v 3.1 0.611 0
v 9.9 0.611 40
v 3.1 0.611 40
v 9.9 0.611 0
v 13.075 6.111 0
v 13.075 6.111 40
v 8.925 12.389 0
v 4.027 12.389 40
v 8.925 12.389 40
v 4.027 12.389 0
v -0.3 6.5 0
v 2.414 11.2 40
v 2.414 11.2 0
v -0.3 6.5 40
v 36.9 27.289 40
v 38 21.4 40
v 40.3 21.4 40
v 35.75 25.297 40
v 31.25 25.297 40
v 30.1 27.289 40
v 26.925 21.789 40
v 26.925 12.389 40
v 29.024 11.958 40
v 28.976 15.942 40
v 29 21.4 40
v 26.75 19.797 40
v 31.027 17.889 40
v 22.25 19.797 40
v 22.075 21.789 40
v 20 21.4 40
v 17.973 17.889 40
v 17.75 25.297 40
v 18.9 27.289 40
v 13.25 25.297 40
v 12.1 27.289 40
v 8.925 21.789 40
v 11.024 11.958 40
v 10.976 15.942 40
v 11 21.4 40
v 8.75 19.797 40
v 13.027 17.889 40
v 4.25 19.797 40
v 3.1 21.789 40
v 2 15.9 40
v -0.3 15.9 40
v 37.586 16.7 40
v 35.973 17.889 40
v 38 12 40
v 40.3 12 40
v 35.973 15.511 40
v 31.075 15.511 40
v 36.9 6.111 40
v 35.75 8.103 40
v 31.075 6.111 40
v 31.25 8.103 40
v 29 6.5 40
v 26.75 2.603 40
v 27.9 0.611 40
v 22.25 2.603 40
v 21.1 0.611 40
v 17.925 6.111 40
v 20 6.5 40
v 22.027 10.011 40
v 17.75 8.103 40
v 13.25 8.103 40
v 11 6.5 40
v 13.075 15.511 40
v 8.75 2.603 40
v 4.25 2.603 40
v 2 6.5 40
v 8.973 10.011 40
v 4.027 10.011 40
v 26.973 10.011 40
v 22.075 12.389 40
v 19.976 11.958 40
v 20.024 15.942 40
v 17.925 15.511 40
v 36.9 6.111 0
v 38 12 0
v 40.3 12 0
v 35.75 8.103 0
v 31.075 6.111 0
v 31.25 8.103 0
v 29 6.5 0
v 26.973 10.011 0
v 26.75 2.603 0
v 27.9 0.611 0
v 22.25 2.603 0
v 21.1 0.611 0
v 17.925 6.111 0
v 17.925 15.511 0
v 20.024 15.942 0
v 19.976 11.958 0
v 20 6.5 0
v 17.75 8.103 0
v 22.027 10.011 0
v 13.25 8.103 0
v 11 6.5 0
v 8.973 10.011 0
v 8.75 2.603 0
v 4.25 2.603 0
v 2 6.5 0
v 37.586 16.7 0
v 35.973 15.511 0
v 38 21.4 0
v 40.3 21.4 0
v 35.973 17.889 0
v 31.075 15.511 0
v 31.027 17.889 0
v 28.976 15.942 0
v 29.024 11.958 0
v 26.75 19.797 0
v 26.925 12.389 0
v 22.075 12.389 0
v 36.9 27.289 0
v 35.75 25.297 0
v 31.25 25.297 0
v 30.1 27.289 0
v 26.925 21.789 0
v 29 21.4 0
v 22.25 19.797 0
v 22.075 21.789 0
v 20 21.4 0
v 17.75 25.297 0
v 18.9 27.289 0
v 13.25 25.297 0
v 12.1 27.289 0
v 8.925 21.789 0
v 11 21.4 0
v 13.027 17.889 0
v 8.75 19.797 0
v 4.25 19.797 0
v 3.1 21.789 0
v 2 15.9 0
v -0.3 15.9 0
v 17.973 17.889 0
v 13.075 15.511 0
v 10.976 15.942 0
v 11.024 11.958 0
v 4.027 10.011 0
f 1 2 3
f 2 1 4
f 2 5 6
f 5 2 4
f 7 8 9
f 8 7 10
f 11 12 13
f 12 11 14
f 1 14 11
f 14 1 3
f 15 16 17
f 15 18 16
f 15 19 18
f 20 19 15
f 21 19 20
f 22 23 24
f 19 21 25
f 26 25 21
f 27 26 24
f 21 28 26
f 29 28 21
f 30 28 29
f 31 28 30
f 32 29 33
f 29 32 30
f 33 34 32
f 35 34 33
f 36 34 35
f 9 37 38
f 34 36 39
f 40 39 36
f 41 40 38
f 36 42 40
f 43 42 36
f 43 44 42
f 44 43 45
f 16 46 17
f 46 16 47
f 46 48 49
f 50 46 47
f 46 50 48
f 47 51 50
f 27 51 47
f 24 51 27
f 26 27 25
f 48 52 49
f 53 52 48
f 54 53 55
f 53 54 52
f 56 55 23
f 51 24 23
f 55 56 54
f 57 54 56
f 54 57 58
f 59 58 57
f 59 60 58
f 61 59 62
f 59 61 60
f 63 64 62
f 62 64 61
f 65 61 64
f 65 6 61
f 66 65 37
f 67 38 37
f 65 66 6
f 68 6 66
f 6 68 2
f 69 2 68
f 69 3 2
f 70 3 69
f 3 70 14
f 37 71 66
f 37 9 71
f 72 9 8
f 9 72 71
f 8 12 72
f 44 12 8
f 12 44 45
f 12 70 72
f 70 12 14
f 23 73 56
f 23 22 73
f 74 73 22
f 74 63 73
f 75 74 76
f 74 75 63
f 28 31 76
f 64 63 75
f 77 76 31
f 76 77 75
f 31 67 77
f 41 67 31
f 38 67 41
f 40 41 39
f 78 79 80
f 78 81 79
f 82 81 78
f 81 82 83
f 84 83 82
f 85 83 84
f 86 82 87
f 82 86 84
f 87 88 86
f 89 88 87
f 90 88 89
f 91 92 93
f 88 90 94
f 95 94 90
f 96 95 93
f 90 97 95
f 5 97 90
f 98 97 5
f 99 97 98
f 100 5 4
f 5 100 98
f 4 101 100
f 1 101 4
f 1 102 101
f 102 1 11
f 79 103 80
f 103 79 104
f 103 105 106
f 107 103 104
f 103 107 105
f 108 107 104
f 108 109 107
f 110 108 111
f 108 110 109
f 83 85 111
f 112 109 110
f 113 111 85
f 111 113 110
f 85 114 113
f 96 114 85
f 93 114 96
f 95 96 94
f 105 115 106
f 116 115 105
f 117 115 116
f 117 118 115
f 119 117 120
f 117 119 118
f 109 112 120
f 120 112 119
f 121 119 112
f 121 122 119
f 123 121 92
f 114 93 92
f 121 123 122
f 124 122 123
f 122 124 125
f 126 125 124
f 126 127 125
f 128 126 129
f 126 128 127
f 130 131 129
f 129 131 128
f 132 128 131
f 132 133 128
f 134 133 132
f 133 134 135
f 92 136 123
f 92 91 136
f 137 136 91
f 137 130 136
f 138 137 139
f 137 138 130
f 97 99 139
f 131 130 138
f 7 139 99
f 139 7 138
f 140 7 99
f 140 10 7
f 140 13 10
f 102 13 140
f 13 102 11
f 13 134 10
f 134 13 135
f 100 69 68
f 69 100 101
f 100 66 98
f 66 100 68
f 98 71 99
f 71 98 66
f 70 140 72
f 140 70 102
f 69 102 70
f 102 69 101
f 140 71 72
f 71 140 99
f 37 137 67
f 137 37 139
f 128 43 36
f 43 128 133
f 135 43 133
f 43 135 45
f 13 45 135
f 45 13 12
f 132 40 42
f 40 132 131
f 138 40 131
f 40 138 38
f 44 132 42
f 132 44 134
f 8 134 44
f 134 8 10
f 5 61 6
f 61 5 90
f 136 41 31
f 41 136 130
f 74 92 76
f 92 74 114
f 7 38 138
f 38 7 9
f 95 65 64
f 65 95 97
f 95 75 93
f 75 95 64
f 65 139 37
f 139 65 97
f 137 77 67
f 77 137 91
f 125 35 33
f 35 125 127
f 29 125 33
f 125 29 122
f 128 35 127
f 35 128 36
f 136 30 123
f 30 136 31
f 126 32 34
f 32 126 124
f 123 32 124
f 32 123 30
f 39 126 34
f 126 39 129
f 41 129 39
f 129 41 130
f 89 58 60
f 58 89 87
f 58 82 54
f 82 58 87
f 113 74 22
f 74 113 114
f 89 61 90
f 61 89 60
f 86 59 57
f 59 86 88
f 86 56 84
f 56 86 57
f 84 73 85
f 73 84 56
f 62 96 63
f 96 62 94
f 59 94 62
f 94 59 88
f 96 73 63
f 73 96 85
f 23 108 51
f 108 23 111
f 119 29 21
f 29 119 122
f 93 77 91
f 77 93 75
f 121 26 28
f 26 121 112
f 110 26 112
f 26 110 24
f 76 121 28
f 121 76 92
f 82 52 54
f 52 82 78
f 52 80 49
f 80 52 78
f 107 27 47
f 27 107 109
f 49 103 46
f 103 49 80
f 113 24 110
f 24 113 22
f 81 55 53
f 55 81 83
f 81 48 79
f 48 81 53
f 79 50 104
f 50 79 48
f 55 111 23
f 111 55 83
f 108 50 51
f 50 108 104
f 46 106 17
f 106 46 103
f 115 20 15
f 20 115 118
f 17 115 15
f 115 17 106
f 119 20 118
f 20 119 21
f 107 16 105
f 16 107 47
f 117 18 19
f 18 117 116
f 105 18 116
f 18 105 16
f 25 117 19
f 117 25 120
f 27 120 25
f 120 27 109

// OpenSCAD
// [FL_INDEX: keywords="openscad, 3d_parametric, A_Nest_for_Bees_-_Now_with_Customizer_Support, csg_solid" | COT="Parametric OpenSCAD design from 3DCodeverse"]
// Title: A Nest for Bees - Now with Customizer Support!

 /*!
@brief A Nest for Bees
@details This OpenSCAD script will generate a simple multi unit Bpartment to hold your Bees

@author Mark Gaffney
@version 0.4
@date 2013-03-19

@todo
Fill with Bees!

@warning
Bees should not be disturbed willy nilly!

@note
Changes from previous versions:
0.4
 - renamed some varaibles to make more easy to use with "MakerBot's Thingiverse Customizer"
 - fixed some alignment issues with hexagons
 - fixed off by 1 error for rows and columns
 - fixed some manifoldness issues with cutouts
0.3
 - fixed up some translates to properly account for the chosen wall thickness
 - added option to make hexagons...but it's not very pretty
0.2
 - added union command so all the cells are joined as one solid piece
0.1
 - First implementation

@attention
Copyright (c) 2013 Tyndall National Institute.
All rights reserved.
Permission to use, copy, modify, and distribute this software and its documentation for any purpose, without fee, and without written agreement is hereby granted, provided that the above copyright notice and the following two paragraphs appear in all copies of this software. 

IN NO EVENT SHALL TYNDALL NATIONAL INSTITUTE BE LIABLE TO ANY PARTY FOR DIRECT, INDIRECT, SPECIAL, INCIDENTAL, OR CONSEQUENTIAL DAMAGES ARISING OUT OF THE USE OF THIS SOFTWARE AND ITS DOCUMENTATION, EVEN IF TYNDALL NATIONAL INSTITUTE HAS BEEN ADVISED OF THE POSSIBILITY OF SUCH DAMAGE.

TYNDALL NATIONAL INSTITUTE SPECIFICALLY DISCLAIMS ANY WARRANTIES, INCLUDING, BUT NOT LIMITED TO, THE IMPLIED WARRANTIES OF MERCHANTABILITY AND FITNESS FOR A PARTICULAR PURPOSE.  THE SOFTWARE PROVIDED HEREUNDER IS ON AN "AS IS" BASIS, AND TYNDALL NATIONAL INSTITUTE HAS NO OBLIGATION TO PROVIDE MAINTENANCE, SUPPORT, UPDATES, ENHANCEMENTS, OR MODIFICATIONS.
*/


//**************User*Variables*****************
//these values are all in millimetres... of course! Change them to suit your printer and bee population!

/* [Bpartment Size and Shape] */
// Height: How long a tunnel does your bee like?
height=40;//[20:100]
//Inner Diameter: How wide is your bee?
inner_d=9;// [5:40]
// Wall Thickness: How thin a wall call your printer produce?
wall_t=2;//[0.1:5]
// Row Count: How many floors in this Bpartment?
rows=2;//[1:10]
// Column Count: How many Bpartments per floor?
columns=4;//[1:10]
//Hexagons or Circles: What shape is each Bpartment?
use_hexagons=1;//[0:circle, 1:hexagon]
//If hexagons appear not to mesh nicely try using this
fix=0;//[0:1]

//*********************Calls*******************
/* [Hidden] */
a_bit=0.1;
$fn=6*use_hexagons;//if using circles get 0 which causes OpenSCAD to use the default value instead

union(){

translate(v=[wall_t+(inner_d/2),wall_t+(inner_d/2),height/2]){
	for (i=[0:columns-1]){
		translate (v=[i*(inner_d+(wall_t/2)) -(wall_t/2)*i*use_hexagons,(i%2)*((wall_t+inner_d)/2 -use_hexagons*0.0*wall_t ),0]){
			for (j=[0:rows-1]){
				translate (v=[0,j*(inner_d+wall_t)-j*use_hexagons*0.8*wall_t,0]){
					difference(){
						rotate(a=30*use_hexagons*fix, v=[0,0,1]) cylinder(h=height, r=(inner_d/2)+wall_t+wall_t*use_hexagons*0.15, center=true);
						rotate(a=30*use_hexagons*fix, v=[0,0,1]) cylinder(h=height+2*a_bit, r=(inner_d/2), center=true);
					}
				}
			}
		}
	}
}


}
